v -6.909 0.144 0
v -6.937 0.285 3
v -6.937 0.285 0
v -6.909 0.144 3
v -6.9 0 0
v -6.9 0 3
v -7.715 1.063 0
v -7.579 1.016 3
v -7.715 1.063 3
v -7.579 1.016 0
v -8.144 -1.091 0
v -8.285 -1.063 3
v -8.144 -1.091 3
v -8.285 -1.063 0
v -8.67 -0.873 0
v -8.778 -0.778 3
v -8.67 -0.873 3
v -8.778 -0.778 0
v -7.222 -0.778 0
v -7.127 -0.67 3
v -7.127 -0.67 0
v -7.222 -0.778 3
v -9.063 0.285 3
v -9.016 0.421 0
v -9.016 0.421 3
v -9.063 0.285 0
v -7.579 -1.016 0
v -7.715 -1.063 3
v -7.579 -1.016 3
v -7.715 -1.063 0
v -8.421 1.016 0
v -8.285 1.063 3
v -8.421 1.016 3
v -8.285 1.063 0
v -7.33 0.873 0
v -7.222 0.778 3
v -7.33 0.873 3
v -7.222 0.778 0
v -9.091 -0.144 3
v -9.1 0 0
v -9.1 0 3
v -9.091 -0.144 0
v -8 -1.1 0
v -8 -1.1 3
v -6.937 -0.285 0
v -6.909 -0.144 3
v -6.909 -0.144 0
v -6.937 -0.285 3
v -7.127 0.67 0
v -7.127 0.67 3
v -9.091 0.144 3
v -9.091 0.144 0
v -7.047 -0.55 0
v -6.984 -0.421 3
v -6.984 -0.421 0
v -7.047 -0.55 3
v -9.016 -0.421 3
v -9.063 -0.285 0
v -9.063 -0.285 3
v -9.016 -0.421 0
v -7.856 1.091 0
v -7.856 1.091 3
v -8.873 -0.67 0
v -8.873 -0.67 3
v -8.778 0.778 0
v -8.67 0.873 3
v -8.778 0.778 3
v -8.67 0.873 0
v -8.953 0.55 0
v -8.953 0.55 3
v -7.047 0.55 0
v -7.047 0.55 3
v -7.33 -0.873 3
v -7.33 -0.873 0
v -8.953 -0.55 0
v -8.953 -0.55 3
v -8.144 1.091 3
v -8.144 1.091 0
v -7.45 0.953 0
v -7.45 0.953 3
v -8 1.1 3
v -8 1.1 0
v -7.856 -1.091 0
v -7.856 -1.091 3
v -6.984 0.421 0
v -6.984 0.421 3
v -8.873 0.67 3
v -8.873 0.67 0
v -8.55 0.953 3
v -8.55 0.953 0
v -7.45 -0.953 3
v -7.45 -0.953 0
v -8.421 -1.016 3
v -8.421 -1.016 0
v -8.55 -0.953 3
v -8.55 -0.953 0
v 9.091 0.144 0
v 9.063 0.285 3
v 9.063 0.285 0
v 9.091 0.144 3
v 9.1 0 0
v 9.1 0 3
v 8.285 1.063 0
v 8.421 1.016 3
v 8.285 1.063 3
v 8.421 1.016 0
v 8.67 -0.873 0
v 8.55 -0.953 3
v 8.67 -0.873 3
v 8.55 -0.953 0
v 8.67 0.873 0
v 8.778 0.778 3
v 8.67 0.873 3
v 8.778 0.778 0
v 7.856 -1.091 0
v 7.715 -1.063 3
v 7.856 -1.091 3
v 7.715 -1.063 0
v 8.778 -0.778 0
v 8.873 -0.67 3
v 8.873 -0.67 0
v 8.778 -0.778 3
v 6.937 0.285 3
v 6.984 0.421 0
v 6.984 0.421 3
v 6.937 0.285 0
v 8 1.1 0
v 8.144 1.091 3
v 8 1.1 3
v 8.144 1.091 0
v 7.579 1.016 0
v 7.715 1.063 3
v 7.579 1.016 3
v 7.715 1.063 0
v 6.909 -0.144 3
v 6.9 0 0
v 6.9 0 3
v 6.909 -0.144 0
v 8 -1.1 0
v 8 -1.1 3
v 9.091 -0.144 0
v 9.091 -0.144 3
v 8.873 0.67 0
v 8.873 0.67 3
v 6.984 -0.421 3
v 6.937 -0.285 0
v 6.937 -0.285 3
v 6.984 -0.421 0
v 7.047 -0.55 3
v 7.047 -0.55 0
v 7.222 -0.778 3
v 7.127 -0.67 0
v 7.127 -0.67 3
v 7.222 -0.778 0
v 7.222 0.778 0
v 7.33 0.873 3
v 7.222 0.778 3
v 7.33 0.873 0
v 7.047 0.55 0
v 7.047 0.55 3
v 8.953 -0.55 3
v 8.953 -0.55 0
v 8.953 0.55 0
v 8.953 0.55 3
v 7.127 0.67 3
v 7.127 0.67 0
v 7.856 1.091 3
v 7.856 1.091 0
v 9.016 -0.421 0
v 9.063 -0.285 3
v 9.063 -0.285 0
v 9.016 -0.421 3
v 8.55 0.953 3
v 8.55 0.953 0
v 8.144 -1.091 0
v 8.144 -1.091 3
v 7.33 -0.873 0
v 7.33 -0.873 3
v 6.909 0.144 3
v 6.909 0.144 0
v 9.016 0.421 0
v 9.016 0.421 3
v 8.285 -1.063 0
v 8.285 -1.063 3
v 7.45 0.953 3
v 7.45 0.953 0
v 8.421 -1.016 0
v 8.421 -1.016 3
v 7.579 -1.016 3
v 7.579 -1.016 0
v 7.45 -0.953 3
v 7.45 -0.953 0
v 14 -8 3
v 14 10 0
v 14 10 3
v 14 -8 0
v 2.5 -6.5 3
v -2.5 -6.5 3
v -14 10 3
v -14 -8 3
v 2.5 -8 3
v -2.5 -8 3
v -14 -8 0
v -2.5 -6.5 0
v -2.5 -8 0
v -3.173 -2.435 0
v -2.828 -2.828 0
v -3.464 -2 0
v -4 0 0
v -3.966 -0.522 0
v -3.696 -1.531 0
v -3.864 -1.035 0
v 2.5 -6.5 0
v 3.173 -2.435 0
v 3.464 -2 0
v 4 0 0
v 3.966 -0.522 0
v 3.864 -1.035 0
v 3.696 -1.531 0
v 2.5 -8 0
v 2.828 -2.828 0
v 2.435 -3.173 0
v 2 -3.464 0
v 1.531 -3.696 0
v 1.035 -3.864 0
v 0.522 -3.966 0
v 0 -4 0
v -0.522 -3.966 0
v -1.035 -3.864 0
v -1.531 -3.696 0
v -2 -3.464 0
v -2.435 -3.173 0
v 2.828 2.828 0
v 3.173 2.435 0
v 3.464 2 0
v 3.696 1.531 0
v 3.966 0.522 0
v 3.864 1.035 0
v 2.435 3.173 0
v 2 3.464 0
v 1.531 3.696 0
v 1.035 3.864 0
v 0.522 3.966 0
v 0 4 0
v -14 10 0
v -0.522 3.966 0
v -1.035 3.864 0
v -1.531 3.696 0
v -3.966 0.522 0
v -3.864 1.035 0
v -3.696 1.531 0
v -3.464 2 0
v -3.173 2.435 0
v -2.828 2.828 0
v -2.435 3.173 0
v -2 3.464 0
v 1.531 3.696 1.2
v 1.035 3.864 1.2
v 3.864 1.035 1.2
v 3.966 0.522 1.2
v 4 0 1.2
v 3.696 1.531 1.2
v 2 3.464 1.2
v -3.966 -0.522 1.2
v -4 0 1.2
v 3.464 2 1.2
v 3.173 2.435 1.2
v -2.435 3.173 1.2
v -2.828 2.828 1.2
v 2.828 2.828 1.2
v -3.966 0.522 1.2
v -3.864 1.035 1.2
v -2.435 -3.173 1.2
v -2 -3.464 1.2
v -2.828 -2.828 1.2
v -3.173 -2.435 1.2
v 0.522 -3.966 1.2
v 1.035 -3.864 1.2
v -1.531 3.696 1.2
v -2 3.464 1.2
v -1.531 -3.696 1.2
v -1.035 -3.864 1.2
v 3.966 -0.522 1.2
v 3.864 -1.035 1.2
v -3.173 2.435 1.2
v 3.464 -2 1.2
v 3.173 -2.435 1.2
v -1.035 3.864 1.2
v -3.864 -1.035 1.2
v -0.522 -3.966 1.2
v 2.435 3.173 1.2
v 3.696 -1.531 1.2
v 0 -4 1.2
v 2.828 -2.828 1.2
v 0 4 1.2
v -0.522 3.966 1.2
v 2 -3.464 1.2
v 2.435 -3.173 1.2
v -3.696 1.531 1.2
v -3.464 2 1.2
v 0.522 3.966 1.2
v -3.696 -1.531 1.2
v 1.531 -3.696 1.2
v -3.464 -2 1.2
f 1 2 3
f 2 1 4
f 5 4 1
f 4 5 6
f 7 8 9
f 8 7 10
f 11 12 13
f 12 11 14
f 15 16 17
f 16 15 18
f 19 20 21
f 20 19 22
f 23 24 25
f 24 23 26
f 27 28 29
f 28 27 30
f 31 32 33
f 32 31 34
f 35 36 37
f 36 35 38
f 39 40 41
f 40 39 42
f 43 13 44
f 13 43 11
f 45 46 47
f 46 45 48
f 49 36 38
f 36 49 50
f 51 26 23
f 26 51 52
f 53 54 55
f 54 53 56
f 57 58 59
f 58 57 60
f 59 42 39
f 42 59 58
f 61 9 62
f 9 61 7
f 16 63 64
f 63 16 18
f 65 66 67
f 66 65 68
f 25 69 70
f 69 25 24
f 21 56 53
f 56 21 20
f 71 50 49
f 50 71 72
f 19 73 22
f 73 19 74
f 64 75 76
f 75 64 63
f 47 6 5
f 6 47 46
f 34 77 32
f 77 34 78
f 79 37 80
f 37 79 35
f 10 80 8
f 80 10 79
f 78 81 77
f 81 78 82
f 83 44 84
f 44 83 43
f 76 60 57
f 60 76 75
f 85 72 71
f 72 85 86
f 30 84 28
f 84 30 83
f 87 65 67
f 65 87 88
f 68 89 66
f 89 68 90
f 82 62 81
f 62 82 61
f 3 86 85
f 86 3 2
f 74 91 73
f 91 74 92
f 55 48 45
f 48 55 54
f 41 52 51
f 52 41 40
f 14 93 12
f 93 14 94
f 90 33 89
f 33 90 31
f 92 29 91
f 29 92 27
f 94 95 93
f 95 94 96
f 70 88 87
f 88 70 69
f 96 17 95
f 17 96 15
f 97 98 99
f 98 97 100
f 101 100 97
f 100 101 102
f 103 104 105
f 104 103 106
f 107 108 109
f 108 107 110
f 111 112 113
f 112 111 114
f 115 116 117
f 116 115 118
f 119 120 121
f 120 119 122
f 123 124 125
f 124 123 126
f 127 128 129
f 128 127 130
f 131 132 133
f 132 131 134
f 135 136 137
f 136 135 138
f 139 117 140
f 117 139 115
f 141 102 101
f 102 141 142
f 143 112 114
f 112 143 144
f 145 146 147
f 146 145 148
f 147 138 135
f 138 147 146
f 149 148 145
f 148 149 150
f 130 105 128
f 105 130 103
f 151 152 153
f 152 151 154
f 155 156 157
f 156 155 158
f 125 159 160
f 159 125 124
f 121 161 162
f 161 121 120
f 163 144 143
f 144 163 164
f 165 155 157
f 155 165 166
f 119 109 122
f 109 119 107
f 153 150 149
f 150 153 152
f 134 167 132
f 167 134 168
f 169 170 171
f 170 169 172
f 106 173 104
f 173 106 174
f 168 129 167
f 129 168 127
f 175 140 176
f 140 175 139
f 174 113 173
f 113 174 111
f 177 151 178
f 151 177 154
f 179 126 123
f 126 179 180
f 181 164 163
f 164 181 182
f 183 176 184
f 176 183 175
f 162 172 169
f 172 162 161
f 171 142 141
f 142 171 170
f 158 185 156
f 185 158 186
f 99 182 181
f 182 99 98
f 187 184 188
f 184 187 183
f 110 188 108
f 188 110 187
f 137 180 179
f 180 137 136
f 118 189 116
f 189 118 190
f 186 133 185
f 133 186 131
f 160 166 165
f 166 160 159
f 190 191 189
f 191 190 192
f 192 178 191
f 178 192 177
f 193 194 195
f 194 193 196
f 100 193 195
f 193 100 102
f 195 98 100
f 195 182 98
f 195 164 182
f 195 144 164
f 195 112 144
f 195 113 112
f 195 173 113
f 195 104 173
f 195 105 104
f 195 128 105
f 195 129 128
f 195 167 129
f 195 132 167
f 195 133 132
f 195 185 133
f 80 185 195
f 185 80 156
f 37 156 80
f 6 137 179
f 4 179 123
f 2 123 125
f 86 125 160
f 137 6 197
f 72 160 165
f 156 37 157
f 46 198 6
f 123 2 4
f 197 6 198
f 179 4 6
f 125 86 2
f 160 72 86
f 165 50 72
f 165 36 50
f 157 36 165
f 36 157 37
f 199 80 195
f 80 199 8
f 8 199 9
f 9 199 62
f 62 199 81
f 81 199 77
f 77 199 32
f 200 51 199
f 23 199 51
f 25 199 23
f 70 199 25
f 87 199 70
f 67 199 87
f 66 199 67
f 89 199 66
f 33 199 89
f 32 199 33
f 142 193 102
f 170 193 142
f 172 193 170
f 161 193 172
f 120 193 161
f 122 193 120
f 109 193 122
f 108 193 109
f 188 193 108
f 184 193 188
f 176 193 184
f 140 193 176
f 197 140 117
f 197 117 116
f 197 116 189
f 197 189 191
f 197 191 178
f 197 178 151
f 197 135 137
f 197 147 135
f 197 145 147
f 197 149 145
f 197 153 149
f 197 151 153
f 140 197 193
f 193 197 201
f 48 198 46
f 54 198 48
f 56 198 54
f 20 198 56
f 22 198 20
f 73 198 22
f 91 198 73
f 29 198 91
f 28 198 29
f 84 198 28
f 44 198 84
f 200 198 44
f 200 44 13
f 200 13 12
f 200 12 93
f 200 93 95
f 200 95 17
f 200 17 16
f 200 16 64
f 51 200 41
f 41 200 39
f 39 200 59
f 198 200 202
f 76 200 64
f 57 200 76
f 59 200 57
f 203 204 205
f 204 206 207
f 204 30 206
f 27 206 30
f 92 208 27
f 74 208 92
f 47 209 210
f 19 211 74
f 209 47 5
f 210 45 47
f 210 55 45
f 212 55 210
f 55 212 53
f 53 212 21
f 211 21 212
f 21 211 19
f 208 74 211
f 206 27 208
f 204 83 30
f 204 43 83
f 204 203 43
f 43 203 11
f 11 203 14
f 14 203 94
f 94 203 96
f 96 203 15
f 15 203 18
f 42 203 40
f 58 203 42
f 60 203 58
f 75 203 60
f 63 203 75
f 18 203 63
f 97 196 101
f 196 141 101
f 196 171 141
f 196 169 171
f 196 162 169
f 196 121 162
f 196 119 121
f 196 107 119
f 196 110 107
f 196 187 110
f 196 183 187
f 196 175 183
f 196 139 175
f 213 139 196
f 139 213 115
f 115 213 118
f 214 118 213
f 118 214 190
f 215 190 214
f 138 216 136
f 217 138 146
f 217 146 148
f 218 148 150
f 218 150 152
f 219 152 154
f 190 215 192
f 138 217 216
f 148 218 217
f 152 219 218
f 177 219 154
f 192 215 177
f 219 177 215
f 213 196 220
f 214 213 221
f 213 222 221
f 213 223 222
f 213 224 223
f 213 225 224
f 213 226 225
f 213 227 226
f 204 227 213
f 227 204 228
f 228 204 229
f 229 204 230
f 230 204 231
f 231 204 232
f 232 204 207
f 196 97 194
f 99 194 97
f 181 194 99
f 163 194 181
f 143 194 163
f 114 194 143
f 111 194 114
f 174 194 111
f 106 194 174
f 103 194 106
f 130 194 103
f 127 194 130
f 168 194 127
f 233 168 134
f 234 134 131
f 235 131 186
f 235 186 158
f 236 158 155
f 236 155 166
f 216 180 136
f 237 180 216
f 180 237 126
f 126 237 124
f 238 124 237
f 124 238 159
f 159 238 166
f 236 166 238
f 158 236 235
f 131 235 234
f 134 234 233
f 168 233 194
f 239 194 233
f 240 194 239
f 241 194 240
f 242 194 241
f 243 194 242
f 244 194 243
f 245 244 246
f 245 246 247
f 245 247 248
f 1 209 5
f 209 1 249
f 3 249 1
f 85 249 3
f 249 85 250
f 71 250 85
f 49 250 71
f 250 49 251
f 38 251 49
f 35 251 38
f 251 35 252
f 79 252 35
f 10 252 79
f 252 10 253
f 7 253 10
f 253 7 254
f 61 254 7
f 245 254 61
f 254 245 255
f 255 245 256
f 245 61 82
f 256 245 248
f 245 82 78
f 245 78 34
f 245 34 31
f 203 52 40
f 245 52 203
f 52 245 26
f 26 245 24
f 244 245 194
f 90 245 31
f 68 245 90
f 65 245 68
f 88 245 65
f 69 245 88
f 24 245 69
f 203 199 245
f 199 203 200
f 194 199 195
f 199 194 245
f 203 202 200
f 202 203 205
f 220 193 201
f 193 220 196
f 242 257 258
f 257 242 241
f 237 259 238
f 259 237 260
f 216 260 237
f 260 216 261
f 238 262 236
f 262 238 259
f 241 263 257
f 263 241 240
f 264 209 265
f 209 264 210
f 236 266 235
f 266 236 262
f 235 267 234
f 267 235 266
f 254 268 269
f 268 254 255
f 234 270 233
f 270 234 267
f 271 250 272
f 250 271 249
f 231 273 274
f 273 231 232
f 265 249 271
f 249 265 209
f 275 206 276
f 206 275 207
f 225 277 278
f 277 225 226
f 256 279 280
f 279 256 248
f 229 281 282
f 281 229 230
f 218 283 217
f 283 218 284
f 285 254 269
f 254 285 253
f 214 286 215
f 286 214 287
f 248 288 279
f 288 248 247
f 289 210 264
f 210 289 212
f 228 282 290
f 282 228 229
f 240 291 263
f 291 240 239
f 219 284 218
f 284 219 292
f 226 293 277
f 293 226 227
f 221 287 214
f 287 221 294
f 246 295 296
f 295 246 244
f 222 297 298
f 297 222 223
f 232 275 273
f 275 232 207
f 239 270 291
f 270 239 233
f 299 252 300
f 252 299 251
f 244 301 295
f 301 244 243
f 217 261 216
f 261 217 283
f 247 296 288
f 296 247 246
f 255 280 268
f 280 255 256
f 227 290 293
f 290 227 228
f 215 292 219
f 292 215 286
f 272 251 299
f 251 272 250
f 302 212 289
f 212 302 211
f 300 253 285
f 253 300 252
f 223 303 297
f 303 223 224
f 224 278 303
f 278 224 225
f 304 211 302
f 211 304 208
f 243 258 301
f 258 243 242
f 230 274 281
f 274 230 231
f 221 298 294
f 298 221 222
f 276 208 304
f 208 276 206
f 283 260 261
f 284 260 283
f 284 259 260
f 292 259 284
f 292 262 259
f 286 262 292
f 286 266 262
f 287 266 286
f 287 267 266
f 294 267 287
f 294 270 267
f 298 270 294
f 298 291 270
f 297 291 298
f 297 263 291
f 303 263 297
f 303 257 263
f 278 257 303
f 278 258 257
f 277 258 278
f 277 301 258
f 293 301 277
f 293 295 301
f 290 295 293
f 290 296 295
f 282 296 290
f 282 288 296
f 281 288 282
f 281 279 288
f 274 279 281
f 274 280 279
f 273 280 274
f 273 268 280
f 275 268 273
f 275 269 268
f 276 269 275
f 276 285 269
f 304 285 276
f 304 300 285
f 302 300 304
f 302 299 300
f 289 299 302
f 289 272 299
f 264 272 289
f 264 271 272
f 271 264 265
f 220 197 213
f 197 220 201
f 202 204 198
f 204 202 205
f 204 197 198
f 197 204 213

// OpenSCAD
// =============================================================================
// mount_standard.scad — the shared wrist-mount interface for the robot arm
// =============================================================================
//
// WHAT THIS IS
//   One printed "adapter plate" that bolts to the last servo's horn on your arm.
//   EVERY tool the arm carries (the pen holder, this magnet pickup, a future
//   gripper...) is built starting from THIS plate, so they all mount the same
//   way, in the same spot, facing the same direction. Design a tool once and it
//   clicks onto the arm like the others — no re-measuring, no re-drilling.
//
//   This file is a LIBRARY, not a finished part. A tool file pulls it in with:
//         use <mount_standard.scad>
//   then calls  mount_plate();  and builds its own body on top of it.
//
// HOW TO USE IT (makers)
//   1. Open this file in OpenSCAD and press F5 to preview the bare plate.
//   2. Measure YOUR servo horn (each parameter below says what to measure) and
//      edit the numbers. This one file is the single place the interface lives.
//   3. Don't slice THIS file for real use — slice a TOOL file (e.g.
//      magnet_tool.scad) that includes it. The bare plate is only handy as a
//      quick "does my horn fit?" test print.
//
// RENDER STATUS (2026-08-07)
//   OpenSCAD 2021.01 rendered the default plate and the no-hub/no-notch branch
//   to simple manifold STL meshes without warnings. This validates the source
//   geometry only. The placeholder dimensions, physical fit, strength, slicing
//   and print behaviour remain unverified.
//
// SAFETY (arm rails)
//   This file makes ONLY the passive mounting interface — there is no motion
//   code here and none belongs here. This passive model makes no claim about
//   Arduino startup or hardware safety. Any powered arm route still needs
//   measured limits, reviewed startup and supervised testing. Any tool that
//   lifts a load is a "check this yourself."
// =============================================================================


// ---- BENCH WORDS (one line each) --------------------------------------------
// servo horn    : the star/arm-shaped disc bolted to the servo shaft that moves.
// bolt pattern  : the spacing + size of the screw holes. Match it, tools fit.
// key / keying  : a shape that fits only one way so the tool can't spin or sit
//                 crooked. Here: a round recess that seats the horn's raised hub,
//                 plus a notch that marks the mounting ("back") edge.
// clearance hole: a hole a bit BIGGER than the screw so the screw slides through
//                 freely (it grips the horn underneath, not this plate).


// =============================================================================
// PARAMETERS — measure your horn, then edit. Each has its own note.
// =============================================================================

// -- The two horn screws (the bolt pattern every tool shares) --
horn_span     = 16.0;   // PLACEHOLDER: centre-to-centre distance between the two horn screws
                        // (mm). Measure hole-centre to hole-centre on your horn.
horn_screw_d  = 2.2;    // PLACEHOLDER: screw clearance diameter (mm). Measure the
                        // real fastener and validate it with a thin test print.

// -- Plate size + thickness --
mount_th      = 3.0;    // PLACEHOLDER: plate thickness (mm). Determine from the
                        // real load, material, orientation and a supervised test.
plate_w       = 28.0;   // plate width, across the two screws (mm).
plate_front   = 10.0;   // how far the plate reaches FORWARD of the horn centre
                        // (mm). Tools that need more room pass a bigger value.
plate_back    =  8.0;   // how far it reaches BEHIND the horn centre (mm).

// -- Keying feature #1: the hub recess (centres the plate, resists wobble) --
// If the measured horn has a raised round hub, a shallow recess can centre the
// plate on the shaft. With the two
// offset screws, it stops the plate shifting or pivoting.
horn_hub_d    = 8.0;    // diameter of your horn's raised centre hub (mm).
                        // Set to 0 to switch the hub recess OFF.
horn_hub_th   = 1.2;    // recess depth (mm) — keep it a little LESS than the hub's
                        // real height so the plate still clamps flat on the screws.

// -- Keying feature #2: the orientation notch (marks the mounting edge) --
// A small notch cut into the BACK edge. Convention for this whole tool family:
// build every tool with its working end (pen tip, magnet, fingers) pointing to
// +Y, and the notch always marks the opposite, "back", edge. Same notch = every
// tool goes on the arm the same way round, every time.
key_notch     = true;   // set false to remove the notch.
key_notch_w   = 5.0;    // notch width (mm).
key_notch_d   = 1.5;    // notch depth (mm).

// -- Print quality --
$fn = 48;               // roundness of holes/cylinders in preview + render.


// =============================================================================
// mount_top() — height of the plate's top face. A tool stacks its body on top:
//     translate([0, 0, mount_top()]) my_tool_body();
// =============================================================================
function mount_top() = mount_th;


// =============================================================================
// mount_bolt_holes() — just the two horn-screw clearance holes (to subtract).
// A tool that wants to draw its own custom plate can reuse only this pattern.
// =============================================================================
module mount_bolt_holes() {
    for (sx = [-horn_span/2, horn_span/2])
        translate([sx, 0, -0.5])
            cylinder(h = mount_th + 1, d = horn_screw_d);
}


// =============================================================================
// mount_plate() — the full shared interface plate.
//   * flat plate centred on the origin, top face at Z = mount_th
//   * the two horn-screw clearance holes (bolt pattern) on the origin line
//   * a shallow hub recess on the BOTTOM (key #1 — centres it on the horn)
//   * a notch on the BACK edge (key #2 — marks the mounting orientation)
//   front / back = how far the plate reaches in +Y / -Y. A tool passes a bigger
//   `front` when it needs plate under a part that sits forward of the screws.
// =============================================================================
module mount_plate(front = plate_front, back = plate_back) {
    difference() {
        // the plate itself
        translate([-plate_w/2, -back, 0])
            cube([plate_w, back + front, mount_th]);

        // the two horn-screw clearance holes (the shared bolt pattern)
        mount_bolt_holes();

        // key #1 — hub recess, cut into the BOTTOM face, only if enabled
        if (horn_hub_d > 0)
            translate([0, 0, -0.01])
                cylinder(h = horn_hub_th + 0.01, d = horn_hub_d);

        // key #2 — orientation notch on the BACK edge (at -Y)
        if (key_notch)
            translate([-key_notch_w/2, -back - 0.5, -0.5])
                cube([key_notch_w, key_notch_d + 0.5, mount_th + 1]);
    }
}


// =============================================================================
// PREVIEW — draws the bare plate when you open THIS file directly.
// (A tool file that `use`s this library does NOT run this line — `use` pulls in
//  the modules/function but not top-level calls, so you get the plate to build
//  on without a stray copy floating in your tool.)
// =============================================================================
mount_plate();
